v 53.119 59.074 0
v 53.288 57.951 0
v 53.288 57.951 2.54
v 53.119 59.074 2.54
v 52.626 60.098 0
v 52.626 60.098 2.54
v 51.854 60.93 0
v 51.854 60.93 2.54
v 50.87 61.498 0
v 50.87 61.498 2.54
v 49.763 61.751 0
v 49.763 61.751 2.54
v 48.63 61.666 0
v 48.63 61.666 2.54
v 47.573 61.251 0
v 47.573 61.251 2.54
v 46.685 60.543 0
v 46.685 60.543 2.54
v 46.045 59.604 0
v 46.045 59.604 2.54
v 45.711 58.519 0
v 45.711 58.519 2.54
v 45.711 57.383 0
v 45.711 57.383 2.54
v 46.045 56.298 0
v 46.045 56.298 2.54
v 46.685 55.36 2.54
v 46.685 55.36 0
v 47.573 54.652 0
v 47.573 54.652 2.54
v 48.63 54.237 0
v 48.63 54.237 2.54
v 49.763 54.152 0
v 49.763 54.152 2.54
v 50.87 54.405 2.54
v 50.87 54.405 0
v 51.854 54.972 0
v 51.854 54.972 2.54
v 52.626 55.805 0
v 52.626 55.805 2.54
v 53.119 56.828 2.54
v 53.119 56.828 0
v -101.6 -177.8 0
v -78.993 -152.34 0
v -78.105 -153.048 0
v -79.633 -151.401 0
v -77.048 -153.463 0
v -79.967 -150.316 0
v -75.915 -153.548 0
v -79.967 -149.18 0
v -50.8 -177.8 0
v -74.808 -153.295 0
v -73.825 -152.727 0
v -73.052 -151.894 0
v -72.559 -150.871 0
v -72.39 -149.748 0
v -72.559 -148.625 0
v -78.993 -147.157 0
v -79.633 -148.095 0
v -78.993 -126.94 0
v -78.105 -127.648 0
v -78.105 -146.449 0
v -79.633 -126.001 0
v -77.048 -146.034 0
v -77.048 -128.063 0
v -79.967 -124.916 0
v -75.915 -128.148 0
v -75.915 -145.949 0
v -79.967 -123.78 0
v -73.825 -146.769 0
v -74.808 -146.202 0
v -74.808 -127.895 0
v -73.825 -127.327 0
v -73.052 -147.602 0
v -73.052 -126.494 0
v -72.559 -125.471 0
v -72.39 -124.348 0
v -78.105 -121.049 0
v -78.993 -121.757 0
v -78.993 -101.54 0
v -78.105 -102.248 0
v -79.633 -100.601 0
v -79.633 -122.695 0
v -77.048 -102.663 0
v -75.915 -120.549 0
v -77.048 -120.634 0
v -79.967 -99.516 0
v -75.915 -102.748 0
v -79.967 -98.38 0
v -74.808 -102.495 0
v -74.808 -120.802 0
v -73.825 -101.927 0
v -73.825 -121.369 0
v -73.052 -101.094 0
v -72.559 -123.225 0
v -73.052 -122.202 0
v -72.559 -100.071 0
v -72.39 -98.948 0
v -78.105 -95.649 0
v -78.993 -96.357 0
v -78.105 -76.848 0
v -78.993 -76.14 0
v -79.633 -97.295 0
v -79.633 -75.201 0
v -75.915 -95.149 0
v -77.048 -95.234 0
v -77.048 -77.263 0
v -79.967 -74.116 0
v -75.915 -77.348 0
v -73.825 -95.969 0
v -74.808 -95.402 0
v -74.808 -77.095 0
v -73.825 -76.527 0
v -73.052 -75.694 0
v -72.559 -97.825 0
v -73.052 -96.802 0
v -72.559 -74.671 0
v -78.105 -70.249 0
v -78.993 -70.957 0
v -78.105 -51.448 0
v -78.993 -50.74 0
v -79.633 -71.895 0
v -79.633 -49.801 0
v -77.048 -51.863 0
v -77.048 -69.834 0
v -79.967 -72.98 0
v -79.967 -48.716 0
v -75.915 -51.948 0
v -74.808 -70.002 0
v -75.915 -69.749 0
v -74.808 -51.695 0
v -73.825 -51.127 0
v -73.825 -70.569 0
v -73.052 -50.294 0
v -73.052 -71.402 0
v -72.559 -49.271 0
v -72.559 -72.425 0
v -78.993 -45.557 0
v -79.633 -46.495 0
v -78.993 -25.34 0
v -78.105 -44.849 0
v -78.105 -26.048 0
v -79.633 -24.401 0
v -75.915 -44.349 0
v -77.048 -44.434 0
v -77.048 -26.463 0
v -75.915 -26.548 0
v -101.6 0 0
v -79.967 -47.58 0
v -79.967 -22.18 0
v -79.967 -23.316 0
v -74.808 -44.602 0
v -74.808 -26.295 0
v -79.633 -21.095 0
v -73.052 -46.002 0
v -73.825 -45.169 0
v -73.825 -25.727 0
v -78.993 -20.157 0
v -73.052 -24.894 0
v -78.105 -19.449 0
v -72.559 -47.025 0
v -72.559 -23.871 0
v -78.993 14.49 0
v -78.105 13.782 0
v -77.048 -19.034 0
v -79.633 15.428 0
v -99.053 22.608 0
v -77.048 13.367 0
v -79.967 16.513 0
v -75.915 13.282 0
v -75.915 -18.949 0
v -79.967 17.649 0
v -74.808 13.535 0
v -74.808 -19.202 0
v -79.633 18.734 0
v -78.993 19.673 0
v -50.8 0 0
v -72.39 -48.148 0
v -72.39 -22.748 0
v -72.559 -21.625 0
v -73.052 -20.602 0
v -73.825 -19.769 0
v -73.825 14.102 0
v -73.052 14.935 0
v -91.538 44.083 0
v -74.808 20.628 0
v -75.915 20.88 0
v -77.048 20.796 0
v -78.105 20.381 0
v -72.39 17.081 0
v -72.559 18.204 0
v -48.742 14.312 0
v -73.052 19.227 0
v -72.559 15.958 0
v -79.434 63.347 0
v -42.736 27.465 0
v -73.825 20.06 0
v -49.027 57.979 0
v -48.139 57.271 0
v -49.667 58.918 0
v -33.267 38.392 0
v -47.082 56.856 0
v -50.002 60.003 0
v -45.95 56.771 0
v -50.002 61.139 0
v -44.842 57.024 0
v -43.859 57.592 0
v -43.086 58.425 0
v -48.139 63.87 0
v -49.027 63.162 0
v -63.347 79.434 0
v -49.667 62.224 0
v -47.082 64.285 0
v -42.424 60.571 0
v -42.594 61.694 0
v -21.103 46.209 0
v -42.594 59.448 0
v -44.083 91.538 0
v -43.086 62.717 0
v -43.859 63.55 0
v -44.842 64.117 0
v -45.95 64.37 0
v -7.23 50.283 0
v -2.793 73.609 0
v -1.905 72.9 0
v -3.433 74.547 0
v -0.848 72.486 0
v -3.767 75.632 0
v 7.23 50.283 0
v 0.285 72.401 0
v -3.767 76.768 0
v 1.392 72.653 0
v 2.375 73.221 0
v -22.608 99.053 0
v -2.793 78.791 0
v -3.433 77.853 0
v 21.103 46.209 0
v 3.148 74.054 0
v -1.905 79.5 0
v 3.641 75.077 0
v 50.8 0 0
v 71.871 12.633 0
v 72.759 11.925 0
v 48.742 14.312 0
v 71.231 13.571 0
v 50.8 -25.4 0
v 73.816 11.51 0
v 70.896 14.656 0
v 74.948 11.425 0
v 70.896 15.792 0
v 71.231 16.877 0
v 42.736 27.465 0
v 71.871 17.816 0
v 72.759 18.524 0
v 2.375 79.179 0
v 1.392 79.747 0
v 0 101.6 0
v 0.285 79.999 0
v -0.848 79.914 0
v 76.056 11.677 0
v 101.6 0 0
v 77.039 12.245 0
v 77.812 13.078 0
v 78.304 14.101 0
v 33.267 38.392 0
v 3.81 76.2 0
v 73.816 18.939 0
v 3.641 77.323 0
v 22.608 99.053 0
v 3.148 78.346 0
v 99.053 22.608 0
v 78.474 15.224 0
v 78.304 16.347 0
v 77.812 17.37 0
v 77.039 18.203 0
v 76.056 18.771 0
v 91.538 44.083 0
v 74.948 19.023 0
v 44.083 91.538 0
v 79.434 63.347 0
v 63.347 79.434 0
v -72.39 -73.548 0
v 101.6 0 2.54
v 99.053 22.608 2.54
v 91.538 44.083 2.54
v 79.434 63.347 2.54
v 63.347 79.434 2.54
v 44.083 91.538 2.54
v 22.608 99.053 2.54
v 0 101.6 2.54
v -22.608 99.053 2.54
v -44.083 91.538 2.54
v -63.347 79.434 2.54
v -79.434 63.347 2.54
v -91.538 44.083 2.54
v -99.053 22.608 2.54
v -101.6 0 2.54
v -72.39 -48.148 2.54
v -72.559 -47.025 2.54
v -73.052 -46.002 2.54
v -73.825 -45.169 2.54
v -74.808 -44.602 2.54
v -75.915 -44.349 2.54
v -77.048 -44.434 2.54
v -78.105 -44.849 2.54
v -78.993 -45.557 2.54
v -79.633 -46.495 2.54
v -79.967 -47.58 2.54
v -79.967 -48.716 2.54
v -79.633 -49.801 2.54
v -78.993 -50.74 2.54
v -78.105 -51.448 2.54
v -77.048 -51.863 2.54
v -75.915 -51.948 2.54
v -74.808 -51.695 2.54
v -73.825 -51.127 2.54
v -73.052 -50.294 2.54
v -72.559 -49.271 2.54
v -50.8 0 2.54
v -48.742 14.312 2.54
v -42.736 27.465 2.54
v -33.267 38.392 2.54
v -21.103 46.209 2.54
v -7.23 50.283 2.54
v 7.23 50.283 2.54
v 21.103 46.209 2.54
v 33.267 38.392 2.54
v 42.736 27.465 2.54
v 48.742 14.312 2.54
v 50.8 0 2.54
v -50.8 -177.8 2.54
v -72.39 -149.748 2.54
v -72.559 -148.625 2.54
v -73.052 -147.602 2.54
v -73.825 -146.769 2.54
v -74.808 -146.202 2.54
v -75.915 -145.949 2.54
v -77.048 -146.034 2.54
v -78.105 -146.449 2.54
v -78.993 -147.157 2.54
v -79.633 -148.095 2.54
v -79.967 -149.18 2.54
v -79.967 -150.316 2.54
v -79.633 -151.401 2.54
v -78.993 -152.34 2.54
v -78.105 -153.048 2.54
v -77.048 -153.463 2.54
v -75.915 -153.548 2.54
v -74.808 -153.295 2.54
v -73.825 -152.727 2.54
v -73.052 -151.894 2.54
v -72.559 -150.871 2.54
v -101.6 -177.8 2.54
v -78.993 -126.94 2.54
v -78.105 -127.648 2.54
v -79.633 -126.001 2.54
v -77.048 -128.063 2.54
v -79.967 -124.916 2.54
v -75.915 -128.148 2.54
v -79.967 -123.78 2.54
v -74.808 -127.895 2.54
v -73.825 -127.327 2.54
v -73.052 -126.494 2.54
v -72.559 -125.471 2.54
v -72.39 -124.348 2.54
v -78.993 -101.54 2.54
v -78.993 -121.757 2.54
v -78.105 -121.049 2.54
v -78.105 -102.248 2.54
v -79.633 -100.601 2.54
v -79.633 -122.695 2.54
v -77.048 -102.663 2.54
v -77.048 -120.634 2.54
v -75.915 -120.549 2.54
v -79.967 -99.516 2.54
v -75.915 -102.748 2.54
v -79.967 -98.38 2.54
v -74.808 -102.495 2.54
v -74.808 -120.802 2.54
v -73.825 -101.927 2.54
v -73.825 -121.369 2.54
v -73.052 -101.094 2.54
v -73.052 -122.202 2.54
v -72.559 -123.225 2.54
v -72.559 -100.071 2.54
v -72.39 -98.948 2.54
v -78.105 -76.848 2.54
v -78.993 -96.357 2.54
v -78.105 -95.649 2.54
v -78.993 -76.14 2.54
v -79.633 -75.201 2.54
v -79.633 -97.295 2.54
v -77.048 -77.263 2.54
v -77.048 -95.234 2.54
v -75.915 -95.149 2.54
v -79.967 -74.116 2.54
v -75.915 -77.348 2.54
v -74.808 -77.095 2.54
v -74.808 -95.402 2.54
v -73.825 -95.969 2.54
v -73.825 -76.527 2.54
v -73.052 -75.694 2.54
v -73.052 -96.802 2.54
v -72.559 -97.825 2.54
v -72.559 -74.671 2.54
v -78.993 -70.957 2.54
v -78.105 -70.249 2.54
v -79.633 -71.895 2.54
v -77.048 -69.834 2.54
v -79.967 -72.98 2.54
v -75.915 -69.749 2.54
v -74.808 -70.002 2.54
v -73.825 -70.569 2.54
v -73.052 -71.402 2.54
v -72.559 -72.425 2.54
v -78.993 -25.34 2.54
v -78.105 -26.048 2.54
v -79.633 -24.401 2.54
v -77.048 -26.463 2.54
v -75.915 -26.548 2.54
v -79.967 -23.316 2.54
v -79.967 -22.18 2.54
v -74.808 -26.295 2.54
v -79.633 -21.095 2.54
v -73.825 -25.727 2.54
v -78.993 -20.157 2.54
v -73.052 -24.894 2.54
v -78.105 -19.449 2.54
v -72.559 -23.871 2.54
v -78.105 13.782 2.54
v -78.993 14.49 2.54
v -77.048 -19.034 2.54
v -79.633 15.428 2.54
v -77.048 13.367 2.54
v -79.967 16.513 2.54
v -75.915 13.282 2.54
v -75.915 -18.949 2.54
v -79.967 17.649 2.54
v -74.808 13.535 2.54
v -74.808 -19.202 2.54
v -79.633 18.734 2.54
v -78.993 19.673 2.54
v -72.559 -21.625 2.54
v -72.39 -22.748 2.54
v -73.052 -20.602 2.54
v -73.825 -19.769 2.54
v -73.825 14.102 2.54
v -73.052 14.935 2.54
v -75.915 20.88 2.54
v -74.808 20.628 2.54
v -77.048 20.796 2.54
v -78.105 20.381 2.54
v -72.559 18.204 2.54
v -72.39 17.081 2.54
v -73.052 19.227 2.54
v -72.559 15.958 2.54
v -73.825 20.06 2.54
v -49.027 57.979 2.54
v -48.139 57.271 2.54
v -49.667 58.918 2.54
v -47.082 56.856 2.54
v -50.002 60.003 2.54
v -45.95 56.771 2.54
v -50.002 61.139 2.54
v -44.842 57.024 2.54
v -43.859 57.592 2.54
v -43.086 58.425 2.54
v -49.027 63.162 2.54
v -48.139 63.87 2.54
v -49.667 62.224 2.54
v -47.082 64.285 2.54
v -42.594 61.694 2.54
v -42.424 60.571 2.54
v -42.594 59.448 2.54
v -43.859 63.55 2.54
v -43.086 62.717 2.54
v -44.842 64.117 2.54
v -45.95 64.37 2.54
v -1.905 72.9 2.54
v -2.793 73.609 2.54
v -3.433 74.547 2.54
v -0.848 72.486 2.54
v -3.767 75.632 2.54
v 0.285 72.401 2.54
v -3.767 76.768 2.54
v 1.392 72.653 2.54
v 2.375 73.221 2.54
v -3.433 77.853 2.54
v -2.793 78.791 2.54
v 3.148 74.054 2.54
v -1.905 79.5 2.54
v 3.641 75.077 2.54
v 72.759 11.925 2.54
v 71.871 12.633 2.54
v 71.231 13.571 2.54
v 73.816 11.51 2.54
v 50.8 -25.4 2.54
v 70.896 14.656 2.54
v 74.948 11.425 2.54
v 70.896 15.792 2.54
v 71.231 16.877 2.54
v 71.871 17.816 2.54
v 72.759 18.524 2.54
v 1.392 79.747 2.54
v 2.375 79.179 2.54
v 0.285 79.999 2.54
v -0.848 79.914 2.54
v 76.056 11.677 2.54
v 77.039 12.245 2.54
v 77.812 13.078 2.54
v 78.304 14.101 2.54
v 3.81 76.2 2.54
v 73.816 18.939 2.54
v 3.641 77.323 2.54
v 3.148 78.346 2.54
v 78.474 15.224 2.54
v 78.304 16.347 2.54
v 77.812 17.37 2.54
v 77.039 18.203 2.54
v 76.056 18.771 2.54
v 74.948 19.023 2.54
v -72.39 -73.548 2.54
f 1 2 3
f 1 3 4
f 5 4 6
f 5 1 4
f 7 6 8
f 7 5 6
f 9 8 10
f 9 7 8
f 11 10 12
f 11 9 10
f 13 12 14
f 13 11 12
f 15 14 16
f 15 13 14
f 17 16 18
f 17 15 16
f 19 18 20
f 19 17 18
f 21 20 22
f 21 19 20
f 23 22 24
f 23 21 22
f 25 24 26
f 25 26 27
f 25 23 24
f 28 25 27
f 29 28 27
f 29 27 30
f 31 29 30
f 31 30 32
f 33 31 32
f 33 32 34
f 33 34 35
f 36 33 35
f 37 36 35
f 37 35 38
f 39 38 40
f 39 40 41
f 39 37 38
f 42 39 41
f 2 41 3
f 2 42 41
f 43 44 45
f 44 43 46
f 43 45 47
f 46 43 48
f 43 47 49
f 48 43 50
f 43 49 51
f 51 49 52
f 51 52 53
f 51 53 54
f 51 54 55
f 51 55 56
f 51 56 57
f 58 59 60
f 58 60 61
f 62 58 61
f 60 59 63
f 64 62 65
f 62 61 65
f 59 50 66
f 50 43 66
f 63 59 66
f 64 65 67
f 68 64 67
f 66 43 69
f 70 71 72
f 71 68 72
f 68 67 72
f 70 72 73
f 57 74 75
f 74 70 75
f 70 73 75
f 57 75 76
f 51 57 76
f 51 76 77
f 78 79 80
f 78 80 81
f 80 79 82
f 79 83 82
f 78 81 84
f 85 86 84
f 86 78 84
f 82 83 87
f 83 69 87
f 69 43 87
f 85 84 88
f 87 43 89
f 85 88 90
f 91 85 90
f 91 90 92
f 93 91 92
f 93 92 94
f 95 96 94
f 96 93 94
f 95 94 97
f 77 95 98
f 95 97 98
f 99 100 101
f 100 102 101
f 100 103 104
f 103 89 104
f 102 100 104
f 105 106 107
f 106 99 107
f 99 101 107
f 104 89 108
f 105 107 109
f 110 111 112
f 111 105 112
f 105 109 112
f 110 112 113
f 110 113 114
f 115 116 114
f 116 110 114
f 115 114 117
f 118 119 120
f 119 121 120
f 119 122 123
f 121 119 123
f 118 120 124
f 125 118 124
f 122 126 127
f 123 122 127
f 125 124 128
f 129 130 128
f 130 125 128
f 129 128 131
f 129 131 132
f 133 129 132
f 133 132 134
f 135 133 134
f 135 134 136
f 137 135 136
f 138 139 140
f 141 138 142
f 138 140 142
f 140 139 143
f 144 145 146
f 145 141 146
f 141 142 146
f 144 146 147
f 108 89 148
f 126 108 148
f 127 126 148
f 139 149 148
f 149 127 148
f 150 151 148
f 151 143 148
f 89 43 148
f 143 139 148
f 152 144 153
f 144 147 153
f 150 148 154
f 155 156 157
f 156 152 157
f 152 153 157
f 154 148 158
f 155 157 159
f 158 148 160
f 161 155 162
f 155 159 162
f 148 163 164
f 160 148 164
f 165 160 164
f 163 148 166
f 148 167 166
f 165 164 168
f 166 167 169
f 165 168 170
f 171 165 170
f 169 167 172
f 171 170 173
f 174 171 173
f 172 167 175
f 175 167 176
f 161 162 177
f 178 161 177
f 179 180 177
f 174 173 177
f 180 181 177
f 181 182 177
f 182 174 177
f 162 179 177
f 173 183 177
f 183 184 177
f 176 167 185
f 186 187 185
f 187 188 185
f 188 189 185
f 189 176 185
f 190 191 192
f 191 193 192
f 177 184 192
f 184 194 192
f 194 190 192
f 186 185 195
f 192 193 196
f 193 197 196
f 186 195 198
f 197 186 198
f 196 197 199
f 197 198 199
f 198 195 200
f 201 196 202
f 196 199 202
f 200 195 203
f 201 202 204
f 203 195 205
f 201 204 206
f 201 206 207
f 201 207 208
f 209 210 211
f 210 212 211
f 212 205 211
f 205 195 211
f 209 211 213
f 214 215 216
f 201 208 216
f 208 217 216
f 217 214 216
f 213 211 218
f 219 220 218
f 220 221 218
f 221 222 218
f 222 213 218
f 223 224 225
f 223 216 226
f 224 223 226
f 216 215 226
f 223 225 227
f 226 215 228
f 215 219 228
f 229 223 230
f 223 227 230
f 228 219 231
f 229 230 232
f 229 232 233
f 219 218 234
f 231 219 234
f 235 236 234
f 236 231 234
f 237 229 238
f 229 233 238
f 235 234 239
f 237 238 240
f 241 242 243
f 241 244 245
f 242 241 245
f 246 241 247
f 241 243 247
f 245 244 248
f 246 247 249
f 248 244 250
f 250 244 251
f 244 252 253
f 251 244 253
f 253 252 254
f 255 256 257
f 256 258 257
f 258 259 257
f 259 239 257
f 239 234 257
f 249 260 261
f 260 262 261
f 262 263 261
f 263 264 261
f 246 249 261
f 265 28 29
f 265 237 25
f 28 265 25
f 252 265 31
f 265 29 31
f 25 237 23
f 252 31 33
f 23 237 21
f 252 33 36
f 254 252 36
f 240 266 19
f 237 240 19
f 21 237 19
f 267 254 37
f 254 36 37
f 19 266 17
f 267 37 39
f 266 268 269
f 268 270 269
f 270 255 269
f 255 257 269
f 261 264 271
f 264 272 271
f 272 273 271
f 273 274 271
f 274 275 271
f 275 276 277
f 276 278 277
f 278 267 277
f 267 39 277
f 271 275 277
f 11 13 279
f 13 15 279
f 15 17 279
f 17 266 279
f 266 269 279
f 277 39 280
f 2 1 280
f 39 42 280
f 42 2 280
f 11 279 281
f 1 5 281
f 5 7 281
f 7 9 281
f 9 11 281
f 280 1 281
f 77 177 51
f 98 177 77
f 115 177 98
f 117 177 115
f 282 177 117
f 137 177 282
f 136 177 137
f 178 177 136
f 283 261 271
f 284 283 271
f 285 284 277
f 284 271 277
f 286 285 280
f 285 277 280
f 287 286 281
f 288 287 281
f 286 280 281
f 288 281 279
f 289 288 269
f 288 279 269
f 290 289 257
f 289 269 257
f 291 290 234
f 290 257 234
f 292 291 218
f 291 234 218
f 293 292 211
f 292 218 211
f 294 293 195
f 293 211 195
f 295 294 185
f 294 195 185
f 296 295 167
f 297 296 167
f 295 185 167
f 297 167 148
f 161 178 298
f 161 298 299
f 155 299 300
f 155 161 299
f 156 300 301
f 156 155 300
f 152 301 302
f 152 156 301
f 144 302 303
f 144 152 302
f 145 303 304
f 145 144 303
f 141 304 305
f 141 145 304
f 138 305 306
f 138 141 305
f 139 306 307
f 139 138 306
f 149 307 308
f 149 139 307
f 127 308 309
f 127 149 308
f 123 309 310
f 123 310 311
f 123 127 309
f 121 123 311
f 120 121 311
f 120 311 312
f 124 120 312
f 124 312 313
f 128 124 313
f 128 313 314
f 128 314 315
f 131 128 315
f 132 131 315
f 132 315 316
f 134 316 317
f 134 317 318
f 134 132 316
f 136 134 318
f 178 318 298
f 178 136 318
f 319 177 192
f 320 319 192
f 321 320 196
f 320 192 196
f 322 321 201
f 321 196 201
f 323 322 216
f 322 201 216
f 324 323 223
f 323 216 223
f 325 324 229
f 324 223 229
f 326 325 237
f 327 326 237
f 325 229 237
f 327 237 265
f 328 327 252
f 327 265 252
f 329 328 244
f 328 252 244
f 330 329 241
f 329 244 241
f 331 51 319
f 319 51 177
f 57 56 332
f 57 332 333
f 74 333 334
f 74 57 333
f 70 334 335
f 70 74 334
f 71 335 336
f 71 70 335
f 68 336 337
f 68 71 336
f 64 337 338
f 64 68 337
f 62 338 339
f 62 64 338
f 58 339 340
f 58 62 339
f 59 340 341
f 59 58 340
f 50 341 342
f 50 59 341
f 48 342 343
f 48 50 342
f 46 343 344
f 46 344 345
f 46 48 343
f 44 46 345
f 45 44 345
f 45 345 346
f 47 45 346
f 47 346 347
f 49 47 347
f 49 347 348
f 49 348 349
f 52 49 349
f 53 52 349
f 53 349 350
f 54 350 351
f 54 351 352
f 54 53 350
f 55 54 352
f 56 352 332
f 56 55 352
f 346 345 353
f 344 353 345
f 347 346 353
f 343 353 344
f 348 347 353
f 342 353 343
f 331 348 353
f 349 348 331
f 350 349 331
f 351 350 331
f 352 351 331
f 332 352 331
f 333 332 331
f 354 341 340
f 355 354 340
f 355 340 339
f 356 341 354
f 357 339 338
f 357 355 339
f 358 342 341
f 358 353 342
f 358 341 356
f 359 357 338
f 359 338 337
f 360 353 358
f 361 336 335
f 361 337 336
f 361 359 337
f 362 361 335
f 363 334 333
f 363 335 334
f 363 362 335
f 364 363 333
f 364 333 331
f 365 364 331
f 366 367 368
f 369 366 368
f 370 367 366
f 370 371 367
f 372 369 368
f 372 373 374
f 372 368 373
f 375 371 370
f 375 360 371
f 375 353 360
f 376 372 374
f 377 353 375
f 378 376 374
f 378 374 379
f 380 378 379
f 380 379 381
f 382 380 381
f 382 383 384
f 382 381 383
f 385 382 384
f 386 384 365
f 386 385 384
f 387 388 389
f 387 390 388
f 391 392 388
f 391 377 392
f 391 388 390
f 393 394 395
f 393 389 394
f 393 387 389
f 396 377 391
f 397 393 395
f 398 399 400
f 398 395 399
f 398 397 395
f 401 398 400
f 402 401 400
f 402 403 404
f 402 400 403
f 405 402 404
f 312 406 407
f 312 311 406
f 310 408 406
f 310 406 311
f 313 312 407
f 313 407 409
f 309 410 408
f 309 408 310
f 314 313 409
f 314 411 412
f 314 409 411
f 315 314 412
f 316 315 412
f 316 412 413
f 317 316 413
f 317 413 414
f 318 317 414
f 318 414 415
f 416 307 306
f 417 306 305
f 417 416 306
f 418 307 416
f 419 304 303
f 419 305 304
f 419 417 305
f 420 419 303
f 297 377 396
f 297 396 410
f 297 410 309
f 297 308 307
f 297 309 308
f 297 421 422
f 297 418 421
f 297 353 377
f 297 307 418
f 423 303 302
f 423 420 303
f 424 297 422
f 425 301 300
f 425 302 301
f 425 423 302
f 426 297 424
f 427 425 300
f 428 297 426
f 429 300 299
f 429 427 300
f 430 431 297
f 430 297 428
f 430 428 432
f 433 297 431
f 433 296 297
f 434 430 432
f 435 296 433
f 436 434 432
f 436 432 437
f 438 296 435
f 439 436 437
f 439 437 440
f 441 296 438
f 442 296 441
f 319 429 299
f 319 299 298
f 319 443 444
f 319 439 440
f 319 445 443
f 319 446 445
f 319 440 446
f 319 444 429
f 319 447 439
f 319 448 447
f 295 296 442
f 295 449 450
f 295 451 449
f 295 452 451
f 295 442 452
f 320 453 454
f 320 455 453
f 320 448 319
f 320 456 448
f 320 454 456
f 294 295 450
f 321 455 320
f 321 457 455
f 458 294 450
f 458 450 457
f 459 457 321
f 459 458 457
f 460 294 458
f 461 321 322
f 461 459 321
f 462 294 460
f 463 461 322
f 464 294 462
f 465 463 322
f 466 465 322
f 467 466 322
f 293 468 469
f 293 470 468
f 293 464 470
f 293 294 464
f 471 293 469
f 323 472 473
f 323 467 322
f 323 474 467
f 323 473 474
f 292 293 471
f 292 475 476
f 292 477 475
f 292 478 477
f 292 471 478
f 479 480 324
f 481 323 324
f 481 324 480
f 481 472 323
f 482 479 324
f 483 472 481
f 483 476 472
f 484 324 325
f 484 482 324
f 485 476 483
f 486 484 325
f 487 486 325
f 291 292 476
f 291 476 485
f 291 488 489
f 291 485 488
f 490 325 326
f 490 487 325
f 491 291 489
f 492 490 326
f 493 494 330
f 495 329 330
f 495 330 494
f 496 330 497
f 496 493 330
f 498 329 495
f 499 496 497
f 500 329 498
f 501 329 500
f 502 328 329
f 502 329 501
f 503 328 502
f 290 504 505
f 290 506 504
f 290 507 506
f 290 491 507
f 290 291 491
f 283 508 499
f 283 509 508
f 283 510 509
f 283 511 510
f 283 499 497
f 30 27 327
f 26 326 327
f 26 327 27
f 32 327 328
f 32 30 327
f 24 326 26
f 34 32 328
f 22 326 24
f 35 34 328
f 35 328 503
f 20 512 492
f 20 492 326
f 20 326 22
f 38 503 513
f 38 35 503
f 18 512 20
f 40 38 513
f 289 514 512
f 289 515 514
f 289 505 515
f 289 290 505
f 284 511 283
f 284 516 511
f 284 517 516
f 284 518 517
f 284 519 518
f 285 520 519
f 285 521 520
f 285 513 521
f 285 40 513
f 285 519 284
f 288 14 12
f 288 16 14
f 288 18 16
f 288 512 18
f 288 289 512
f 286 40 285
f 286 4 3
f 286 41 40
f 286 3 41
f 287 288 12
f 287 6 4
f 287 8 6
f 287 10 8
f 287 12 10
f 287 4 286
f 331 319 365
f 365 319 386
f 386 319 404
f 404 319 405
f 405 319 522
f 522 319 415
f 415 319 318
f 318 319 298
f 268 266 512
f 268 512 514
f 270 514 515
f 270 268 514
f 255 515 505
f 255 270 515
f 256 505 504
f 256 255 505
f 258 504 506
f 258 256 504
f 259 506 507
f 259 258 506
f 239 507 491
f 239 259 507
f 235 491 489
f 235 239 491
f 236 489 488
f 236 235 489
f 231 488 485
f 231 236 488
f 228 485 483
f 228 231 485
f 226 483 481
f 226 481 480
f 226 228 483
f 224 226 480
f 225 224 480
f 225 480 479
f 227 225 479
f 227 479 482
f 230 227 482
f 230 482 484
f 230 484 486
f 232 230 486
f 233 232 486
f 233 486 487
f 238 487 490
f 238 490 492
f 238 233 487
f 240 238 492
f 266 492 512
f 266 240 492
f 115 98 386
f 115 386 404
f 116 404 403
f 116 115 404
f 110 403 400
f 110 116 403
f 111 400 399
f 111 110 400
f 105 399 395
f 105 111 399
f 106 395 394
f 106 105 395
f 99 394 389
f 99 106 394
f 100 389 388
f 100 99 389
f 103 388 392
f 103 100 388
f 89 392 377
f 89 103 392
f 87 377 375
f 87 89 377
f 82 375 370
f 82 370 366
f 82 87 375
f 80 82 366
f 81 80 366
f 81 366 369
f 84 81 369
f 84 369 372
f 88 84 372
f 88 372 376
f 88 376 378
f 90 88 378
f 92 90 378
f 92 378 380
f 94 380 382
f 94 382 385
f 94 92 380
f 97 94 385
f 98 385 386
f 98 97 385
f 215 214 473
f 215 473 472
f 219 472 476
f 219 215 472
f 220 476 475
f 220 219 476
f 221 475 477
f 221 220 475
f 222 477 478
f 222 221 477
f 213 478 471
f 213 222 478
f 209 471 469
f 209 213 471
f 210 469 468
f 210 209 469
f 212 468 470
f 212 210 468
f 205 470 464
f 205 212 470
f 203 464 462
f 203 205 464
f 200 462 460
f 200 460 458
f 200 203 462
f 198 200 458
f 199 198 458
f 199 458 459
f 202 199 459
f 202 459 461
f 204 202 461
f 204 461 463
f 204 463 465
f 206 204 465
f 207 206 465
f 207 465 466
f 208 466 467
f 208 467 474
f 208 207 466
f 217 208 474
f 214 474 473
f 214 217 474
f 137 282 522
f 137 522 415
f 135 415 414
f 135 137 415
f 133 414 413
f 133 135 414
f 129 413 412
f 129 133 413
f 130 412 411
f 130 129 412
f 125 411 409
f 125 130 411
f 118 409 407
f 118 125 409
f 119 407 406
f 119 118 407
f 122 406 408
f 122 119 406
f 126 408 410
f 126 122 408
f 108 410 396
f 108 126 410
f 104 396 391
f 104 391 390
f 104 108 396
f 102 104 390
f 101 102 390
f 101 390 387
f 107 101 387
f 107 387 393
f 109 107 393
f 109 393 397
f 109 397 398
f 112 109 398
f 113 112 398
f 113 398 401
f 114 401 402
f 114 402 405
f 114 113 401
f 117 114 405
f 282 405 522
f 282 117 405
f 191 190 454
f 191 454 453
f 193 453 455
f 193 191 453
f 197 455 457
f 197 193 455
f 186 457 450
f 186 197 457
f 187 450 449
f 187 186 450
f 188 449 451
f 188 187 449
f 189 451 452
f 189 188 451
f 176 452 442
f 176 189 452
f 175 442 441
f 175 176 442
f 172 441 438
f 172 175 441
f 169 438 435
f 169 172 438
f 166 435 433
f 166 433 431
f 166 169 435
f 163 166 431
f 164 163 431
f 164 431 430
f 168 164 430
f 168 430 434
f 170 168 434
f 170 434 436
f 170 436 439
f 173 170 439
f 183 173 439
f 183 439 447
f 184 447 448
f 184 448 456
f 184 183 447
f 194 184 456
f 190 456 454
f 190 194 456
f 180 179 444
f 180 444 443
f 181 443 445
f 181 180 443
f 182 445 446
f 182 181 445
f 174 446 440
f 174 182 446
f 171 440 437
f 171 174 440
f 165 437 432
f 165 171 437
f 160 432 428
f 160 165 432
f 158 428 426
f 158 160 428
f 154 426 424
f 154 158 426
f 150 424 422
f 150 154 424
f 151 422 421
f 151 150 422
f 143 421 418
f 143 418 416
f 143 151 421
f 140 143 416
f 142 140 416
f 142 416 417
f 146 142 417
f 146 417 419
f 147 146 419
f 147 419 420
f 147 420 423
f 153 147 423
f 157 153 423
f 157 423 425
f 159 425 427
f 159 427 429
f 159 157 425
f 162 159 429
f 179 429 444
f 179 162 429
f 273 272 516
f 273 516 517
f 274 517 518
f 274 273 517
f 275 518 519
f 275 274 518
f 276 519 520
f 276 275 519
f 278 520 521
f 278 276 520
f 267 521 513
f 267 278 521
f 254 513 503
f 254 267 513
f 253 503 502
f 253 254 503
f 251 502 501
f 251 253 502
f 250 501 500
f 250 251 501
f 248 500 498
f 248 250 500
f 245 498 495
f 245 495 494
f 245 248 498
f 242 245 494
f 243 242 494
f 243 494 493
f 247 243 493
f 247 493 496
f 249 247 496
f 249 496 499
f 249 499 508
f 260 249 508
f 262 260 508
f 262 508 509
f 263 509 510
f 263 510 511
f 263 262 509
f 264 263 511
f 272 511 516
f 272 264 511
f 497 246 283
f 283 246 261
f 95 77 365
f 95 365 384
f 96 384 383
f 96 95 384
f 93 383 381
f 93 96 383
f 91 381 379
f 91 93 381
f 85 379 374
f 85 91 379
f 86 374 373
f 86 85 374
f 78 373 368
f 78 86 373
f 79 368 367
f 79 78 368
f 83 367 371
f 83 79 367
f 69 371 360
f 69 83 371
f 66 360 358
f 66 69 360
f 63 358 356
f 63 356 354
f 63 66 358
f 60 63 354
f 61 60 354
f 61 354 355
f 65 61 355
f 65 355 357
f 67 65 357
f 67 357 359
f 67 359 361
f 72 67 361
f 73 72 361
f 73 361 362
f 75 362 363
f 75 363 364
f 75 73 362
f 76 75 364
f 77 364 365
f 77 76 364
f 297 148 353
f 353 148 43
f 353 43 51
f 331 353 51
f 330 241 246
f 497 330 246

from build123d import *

# Parameters (mm, degrees)
SKETCH1_R           = 3.81
BOSS_EXTRUDE1_DEPTH = 2.54


with BuildPart() as part:
    # Sketch1 → Boss-Extrude1 (new body)
    with BuildSketch(Plane.XY):
        with BuildLine():
            Line((-101.6, 0), (-101.6, -177.8))
            Line((-101.6, -177.8), (-50.8, -177.8))
            Line((-50.8, -177.8), (-50.8, 0))
            ThreePointArc((-50.8, 0), (0, 50.8), (50.8, 0))
            Line((50.8, 0), (50.8, -25.4))
            Line((50.8, -25.4), (101.6, 0))
            ThreePointArc((101.6, 0), (0, 101.6), (-101.6, 0))
        make_face()
        with Locations((0, 76.2)):
            Circle(SKETCH1_R, mode=Mode.SUBTRACT)
        with Locations((74.66369609, 15.224075871)):
            Circle(SKETCH1_R, mode=Mode.SUBTRACT)
        with Locations((49.478172332, 57.951276627)):
            Circle(SKETCH1_R, mode=Mode.SUBTRACT)
        with Locations((-46.234392701, 60.570792727)):
            Circle(SKETCH1_R, mode=Mode.SUBTRACT)
        with Locations((-76.2, 17.081132641)):
            Circle(SKETCH1_R, mode=Mode.SUBTRACT)
        with Locations((-76.2, -22.74822838)):
            Circle(SKETCH1_R, mode=Mode.SUBTRACT)
        with Locations((-76.2, -48.14822838)):
            Circle(SKETCH1_R, mode=Mode.SUBTRACT)
        with Locations((-76.2, -73.54822838)):
            Circle(SKETCH1_R, mode=Mode.SUBTRACT)
        with Locations((-76.2, -98.94822838)):
            Circle(SKETCH1_R, mode=Mode.SUBTRACT)
        with Locations((-76.2, -124.34822838)):
            Circle(SKETCH1_R, mode=Mode.SUBTRACT)
        with Locations((-76.2, -149.74822838)):
            Circle(SKETCH1_R, mode=Mode.SUBTRACT)
    extrude(amount=BOSS_EXTRUDE1_DEPTH)


solid = part.part
